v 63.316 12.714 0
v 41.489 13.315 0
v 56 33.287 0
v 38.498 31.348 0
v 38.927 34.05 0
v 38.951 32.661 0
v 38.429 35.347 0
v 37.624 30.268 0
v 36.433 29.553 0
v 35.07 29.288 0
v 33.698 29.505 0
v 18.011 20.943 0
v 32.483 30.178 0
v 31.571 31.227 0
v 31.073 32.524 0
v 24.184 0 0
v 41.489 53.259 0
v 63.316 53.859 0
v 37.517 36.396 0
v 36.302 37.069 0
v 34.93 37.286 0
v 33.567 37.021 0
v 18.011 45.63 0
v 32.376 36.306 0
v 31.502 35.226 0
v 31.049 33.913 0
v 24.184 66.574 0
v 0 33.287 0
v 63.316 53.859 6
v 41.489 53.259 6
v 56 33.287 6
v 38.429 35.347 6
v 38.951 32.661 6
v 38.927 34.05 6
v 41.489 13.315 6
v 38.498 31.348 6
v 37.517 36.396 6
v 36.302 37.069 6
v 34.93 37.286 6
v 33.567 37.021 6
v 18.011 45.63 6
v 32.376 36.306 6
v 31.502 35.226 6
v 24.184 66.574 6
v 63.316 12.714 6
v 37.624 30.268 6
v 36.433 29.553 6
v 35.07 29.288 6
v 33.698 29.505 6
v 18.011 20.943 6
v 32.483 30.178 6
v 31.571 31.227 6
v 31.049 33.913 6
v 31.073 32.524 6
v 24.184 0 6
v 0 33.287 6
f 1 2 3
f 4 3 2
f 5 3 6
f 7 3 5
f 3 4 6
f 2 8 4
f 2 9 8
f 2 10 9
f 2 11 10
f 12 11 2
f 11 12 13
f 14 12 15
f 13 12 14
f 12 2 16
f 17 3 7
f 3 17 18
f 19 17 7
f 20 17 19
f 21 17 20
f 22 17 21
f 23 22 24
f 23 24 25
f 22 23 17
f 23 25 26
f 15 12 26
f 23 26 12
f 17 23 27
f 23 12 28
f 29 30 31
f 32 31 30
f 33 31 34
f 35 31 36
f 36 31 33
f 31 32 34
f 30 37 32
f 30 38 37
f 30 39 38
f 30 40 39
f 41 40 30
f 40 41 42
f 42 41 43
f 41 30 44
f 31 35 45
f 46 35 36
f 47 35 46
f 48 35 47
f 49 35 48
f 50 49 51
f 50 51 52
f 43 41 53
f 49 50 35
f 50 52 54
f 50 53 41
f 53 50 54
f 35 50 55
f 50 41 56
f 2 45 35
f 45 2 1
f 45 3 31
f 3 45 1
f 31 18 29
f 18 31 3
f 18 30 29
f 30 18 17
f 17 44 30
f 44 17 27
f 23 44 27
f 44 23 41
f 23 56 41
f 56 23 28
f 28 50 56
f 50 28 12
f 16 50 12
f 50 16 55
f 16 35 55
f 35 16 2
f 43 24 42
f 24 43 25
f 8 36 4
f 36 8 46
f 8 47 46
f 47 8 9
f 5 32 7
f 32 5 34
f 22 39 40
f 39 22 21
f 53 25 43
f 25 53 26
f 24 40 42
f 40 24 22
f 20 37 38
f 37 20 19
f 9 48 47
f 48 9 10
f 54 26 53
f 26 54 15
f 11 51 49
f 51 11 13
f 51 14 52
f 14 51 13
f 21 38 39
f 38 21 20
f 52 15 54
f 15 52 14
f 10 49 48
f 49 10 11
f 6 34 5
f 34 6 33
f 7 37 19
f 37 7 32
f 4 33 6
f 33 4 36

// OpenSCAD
$fn = 32;

// ----------------------------------------------------------------------
// Star wheel: 5-point star, R35
// ----------------------------------------------------------------------

// --- parameters (mm) ---
n_points = 5;             // number of points / teeth
r_out = 35;               // tip radius
r_in = 21;                // root radius
bore_r = 4;               // centre bore radius
plate_t = 6;              // plate thickness, Z (extrusion height)
bore_d = 8;               // centre bore diameter

profile = [[0, 33.287], [18.011, 20.943], [24.184, 0], [41.489, 13.315], [63.316, 12.714], [56, 33.287], [63.316, 53.859], [41.489, 53.259], [24.184, 66.574], [18.011, 45.63]];  // primary outline, 10 points, counter clockwise
void_1 = [[38.927, 34.05], [38.429, 35.347], [37.517, 36.396], [36.302, 37.069], [34.93, 37.286], [33.567, 37.021], [32.376, 36.306], [31.502, 35.226], [31.049, 33.913], [31.073, 32.524], [31.571, 31.227], [32.483, 30.178], [33.698, 29.505], [35.07, 29.288], [36.433, 29.553], [37.624, 30.268], [38.498, 31.348], [38.951, 32.661]];  // centre bore, 18 points

// --- the one profile operation ---
difference() {
  linear_extrude(height = plate_t) polygon(points = profile);
  translate([0, 0, -1])
    linear_extrude(height = plate_t + 2) polygon(points = void_1);
}
